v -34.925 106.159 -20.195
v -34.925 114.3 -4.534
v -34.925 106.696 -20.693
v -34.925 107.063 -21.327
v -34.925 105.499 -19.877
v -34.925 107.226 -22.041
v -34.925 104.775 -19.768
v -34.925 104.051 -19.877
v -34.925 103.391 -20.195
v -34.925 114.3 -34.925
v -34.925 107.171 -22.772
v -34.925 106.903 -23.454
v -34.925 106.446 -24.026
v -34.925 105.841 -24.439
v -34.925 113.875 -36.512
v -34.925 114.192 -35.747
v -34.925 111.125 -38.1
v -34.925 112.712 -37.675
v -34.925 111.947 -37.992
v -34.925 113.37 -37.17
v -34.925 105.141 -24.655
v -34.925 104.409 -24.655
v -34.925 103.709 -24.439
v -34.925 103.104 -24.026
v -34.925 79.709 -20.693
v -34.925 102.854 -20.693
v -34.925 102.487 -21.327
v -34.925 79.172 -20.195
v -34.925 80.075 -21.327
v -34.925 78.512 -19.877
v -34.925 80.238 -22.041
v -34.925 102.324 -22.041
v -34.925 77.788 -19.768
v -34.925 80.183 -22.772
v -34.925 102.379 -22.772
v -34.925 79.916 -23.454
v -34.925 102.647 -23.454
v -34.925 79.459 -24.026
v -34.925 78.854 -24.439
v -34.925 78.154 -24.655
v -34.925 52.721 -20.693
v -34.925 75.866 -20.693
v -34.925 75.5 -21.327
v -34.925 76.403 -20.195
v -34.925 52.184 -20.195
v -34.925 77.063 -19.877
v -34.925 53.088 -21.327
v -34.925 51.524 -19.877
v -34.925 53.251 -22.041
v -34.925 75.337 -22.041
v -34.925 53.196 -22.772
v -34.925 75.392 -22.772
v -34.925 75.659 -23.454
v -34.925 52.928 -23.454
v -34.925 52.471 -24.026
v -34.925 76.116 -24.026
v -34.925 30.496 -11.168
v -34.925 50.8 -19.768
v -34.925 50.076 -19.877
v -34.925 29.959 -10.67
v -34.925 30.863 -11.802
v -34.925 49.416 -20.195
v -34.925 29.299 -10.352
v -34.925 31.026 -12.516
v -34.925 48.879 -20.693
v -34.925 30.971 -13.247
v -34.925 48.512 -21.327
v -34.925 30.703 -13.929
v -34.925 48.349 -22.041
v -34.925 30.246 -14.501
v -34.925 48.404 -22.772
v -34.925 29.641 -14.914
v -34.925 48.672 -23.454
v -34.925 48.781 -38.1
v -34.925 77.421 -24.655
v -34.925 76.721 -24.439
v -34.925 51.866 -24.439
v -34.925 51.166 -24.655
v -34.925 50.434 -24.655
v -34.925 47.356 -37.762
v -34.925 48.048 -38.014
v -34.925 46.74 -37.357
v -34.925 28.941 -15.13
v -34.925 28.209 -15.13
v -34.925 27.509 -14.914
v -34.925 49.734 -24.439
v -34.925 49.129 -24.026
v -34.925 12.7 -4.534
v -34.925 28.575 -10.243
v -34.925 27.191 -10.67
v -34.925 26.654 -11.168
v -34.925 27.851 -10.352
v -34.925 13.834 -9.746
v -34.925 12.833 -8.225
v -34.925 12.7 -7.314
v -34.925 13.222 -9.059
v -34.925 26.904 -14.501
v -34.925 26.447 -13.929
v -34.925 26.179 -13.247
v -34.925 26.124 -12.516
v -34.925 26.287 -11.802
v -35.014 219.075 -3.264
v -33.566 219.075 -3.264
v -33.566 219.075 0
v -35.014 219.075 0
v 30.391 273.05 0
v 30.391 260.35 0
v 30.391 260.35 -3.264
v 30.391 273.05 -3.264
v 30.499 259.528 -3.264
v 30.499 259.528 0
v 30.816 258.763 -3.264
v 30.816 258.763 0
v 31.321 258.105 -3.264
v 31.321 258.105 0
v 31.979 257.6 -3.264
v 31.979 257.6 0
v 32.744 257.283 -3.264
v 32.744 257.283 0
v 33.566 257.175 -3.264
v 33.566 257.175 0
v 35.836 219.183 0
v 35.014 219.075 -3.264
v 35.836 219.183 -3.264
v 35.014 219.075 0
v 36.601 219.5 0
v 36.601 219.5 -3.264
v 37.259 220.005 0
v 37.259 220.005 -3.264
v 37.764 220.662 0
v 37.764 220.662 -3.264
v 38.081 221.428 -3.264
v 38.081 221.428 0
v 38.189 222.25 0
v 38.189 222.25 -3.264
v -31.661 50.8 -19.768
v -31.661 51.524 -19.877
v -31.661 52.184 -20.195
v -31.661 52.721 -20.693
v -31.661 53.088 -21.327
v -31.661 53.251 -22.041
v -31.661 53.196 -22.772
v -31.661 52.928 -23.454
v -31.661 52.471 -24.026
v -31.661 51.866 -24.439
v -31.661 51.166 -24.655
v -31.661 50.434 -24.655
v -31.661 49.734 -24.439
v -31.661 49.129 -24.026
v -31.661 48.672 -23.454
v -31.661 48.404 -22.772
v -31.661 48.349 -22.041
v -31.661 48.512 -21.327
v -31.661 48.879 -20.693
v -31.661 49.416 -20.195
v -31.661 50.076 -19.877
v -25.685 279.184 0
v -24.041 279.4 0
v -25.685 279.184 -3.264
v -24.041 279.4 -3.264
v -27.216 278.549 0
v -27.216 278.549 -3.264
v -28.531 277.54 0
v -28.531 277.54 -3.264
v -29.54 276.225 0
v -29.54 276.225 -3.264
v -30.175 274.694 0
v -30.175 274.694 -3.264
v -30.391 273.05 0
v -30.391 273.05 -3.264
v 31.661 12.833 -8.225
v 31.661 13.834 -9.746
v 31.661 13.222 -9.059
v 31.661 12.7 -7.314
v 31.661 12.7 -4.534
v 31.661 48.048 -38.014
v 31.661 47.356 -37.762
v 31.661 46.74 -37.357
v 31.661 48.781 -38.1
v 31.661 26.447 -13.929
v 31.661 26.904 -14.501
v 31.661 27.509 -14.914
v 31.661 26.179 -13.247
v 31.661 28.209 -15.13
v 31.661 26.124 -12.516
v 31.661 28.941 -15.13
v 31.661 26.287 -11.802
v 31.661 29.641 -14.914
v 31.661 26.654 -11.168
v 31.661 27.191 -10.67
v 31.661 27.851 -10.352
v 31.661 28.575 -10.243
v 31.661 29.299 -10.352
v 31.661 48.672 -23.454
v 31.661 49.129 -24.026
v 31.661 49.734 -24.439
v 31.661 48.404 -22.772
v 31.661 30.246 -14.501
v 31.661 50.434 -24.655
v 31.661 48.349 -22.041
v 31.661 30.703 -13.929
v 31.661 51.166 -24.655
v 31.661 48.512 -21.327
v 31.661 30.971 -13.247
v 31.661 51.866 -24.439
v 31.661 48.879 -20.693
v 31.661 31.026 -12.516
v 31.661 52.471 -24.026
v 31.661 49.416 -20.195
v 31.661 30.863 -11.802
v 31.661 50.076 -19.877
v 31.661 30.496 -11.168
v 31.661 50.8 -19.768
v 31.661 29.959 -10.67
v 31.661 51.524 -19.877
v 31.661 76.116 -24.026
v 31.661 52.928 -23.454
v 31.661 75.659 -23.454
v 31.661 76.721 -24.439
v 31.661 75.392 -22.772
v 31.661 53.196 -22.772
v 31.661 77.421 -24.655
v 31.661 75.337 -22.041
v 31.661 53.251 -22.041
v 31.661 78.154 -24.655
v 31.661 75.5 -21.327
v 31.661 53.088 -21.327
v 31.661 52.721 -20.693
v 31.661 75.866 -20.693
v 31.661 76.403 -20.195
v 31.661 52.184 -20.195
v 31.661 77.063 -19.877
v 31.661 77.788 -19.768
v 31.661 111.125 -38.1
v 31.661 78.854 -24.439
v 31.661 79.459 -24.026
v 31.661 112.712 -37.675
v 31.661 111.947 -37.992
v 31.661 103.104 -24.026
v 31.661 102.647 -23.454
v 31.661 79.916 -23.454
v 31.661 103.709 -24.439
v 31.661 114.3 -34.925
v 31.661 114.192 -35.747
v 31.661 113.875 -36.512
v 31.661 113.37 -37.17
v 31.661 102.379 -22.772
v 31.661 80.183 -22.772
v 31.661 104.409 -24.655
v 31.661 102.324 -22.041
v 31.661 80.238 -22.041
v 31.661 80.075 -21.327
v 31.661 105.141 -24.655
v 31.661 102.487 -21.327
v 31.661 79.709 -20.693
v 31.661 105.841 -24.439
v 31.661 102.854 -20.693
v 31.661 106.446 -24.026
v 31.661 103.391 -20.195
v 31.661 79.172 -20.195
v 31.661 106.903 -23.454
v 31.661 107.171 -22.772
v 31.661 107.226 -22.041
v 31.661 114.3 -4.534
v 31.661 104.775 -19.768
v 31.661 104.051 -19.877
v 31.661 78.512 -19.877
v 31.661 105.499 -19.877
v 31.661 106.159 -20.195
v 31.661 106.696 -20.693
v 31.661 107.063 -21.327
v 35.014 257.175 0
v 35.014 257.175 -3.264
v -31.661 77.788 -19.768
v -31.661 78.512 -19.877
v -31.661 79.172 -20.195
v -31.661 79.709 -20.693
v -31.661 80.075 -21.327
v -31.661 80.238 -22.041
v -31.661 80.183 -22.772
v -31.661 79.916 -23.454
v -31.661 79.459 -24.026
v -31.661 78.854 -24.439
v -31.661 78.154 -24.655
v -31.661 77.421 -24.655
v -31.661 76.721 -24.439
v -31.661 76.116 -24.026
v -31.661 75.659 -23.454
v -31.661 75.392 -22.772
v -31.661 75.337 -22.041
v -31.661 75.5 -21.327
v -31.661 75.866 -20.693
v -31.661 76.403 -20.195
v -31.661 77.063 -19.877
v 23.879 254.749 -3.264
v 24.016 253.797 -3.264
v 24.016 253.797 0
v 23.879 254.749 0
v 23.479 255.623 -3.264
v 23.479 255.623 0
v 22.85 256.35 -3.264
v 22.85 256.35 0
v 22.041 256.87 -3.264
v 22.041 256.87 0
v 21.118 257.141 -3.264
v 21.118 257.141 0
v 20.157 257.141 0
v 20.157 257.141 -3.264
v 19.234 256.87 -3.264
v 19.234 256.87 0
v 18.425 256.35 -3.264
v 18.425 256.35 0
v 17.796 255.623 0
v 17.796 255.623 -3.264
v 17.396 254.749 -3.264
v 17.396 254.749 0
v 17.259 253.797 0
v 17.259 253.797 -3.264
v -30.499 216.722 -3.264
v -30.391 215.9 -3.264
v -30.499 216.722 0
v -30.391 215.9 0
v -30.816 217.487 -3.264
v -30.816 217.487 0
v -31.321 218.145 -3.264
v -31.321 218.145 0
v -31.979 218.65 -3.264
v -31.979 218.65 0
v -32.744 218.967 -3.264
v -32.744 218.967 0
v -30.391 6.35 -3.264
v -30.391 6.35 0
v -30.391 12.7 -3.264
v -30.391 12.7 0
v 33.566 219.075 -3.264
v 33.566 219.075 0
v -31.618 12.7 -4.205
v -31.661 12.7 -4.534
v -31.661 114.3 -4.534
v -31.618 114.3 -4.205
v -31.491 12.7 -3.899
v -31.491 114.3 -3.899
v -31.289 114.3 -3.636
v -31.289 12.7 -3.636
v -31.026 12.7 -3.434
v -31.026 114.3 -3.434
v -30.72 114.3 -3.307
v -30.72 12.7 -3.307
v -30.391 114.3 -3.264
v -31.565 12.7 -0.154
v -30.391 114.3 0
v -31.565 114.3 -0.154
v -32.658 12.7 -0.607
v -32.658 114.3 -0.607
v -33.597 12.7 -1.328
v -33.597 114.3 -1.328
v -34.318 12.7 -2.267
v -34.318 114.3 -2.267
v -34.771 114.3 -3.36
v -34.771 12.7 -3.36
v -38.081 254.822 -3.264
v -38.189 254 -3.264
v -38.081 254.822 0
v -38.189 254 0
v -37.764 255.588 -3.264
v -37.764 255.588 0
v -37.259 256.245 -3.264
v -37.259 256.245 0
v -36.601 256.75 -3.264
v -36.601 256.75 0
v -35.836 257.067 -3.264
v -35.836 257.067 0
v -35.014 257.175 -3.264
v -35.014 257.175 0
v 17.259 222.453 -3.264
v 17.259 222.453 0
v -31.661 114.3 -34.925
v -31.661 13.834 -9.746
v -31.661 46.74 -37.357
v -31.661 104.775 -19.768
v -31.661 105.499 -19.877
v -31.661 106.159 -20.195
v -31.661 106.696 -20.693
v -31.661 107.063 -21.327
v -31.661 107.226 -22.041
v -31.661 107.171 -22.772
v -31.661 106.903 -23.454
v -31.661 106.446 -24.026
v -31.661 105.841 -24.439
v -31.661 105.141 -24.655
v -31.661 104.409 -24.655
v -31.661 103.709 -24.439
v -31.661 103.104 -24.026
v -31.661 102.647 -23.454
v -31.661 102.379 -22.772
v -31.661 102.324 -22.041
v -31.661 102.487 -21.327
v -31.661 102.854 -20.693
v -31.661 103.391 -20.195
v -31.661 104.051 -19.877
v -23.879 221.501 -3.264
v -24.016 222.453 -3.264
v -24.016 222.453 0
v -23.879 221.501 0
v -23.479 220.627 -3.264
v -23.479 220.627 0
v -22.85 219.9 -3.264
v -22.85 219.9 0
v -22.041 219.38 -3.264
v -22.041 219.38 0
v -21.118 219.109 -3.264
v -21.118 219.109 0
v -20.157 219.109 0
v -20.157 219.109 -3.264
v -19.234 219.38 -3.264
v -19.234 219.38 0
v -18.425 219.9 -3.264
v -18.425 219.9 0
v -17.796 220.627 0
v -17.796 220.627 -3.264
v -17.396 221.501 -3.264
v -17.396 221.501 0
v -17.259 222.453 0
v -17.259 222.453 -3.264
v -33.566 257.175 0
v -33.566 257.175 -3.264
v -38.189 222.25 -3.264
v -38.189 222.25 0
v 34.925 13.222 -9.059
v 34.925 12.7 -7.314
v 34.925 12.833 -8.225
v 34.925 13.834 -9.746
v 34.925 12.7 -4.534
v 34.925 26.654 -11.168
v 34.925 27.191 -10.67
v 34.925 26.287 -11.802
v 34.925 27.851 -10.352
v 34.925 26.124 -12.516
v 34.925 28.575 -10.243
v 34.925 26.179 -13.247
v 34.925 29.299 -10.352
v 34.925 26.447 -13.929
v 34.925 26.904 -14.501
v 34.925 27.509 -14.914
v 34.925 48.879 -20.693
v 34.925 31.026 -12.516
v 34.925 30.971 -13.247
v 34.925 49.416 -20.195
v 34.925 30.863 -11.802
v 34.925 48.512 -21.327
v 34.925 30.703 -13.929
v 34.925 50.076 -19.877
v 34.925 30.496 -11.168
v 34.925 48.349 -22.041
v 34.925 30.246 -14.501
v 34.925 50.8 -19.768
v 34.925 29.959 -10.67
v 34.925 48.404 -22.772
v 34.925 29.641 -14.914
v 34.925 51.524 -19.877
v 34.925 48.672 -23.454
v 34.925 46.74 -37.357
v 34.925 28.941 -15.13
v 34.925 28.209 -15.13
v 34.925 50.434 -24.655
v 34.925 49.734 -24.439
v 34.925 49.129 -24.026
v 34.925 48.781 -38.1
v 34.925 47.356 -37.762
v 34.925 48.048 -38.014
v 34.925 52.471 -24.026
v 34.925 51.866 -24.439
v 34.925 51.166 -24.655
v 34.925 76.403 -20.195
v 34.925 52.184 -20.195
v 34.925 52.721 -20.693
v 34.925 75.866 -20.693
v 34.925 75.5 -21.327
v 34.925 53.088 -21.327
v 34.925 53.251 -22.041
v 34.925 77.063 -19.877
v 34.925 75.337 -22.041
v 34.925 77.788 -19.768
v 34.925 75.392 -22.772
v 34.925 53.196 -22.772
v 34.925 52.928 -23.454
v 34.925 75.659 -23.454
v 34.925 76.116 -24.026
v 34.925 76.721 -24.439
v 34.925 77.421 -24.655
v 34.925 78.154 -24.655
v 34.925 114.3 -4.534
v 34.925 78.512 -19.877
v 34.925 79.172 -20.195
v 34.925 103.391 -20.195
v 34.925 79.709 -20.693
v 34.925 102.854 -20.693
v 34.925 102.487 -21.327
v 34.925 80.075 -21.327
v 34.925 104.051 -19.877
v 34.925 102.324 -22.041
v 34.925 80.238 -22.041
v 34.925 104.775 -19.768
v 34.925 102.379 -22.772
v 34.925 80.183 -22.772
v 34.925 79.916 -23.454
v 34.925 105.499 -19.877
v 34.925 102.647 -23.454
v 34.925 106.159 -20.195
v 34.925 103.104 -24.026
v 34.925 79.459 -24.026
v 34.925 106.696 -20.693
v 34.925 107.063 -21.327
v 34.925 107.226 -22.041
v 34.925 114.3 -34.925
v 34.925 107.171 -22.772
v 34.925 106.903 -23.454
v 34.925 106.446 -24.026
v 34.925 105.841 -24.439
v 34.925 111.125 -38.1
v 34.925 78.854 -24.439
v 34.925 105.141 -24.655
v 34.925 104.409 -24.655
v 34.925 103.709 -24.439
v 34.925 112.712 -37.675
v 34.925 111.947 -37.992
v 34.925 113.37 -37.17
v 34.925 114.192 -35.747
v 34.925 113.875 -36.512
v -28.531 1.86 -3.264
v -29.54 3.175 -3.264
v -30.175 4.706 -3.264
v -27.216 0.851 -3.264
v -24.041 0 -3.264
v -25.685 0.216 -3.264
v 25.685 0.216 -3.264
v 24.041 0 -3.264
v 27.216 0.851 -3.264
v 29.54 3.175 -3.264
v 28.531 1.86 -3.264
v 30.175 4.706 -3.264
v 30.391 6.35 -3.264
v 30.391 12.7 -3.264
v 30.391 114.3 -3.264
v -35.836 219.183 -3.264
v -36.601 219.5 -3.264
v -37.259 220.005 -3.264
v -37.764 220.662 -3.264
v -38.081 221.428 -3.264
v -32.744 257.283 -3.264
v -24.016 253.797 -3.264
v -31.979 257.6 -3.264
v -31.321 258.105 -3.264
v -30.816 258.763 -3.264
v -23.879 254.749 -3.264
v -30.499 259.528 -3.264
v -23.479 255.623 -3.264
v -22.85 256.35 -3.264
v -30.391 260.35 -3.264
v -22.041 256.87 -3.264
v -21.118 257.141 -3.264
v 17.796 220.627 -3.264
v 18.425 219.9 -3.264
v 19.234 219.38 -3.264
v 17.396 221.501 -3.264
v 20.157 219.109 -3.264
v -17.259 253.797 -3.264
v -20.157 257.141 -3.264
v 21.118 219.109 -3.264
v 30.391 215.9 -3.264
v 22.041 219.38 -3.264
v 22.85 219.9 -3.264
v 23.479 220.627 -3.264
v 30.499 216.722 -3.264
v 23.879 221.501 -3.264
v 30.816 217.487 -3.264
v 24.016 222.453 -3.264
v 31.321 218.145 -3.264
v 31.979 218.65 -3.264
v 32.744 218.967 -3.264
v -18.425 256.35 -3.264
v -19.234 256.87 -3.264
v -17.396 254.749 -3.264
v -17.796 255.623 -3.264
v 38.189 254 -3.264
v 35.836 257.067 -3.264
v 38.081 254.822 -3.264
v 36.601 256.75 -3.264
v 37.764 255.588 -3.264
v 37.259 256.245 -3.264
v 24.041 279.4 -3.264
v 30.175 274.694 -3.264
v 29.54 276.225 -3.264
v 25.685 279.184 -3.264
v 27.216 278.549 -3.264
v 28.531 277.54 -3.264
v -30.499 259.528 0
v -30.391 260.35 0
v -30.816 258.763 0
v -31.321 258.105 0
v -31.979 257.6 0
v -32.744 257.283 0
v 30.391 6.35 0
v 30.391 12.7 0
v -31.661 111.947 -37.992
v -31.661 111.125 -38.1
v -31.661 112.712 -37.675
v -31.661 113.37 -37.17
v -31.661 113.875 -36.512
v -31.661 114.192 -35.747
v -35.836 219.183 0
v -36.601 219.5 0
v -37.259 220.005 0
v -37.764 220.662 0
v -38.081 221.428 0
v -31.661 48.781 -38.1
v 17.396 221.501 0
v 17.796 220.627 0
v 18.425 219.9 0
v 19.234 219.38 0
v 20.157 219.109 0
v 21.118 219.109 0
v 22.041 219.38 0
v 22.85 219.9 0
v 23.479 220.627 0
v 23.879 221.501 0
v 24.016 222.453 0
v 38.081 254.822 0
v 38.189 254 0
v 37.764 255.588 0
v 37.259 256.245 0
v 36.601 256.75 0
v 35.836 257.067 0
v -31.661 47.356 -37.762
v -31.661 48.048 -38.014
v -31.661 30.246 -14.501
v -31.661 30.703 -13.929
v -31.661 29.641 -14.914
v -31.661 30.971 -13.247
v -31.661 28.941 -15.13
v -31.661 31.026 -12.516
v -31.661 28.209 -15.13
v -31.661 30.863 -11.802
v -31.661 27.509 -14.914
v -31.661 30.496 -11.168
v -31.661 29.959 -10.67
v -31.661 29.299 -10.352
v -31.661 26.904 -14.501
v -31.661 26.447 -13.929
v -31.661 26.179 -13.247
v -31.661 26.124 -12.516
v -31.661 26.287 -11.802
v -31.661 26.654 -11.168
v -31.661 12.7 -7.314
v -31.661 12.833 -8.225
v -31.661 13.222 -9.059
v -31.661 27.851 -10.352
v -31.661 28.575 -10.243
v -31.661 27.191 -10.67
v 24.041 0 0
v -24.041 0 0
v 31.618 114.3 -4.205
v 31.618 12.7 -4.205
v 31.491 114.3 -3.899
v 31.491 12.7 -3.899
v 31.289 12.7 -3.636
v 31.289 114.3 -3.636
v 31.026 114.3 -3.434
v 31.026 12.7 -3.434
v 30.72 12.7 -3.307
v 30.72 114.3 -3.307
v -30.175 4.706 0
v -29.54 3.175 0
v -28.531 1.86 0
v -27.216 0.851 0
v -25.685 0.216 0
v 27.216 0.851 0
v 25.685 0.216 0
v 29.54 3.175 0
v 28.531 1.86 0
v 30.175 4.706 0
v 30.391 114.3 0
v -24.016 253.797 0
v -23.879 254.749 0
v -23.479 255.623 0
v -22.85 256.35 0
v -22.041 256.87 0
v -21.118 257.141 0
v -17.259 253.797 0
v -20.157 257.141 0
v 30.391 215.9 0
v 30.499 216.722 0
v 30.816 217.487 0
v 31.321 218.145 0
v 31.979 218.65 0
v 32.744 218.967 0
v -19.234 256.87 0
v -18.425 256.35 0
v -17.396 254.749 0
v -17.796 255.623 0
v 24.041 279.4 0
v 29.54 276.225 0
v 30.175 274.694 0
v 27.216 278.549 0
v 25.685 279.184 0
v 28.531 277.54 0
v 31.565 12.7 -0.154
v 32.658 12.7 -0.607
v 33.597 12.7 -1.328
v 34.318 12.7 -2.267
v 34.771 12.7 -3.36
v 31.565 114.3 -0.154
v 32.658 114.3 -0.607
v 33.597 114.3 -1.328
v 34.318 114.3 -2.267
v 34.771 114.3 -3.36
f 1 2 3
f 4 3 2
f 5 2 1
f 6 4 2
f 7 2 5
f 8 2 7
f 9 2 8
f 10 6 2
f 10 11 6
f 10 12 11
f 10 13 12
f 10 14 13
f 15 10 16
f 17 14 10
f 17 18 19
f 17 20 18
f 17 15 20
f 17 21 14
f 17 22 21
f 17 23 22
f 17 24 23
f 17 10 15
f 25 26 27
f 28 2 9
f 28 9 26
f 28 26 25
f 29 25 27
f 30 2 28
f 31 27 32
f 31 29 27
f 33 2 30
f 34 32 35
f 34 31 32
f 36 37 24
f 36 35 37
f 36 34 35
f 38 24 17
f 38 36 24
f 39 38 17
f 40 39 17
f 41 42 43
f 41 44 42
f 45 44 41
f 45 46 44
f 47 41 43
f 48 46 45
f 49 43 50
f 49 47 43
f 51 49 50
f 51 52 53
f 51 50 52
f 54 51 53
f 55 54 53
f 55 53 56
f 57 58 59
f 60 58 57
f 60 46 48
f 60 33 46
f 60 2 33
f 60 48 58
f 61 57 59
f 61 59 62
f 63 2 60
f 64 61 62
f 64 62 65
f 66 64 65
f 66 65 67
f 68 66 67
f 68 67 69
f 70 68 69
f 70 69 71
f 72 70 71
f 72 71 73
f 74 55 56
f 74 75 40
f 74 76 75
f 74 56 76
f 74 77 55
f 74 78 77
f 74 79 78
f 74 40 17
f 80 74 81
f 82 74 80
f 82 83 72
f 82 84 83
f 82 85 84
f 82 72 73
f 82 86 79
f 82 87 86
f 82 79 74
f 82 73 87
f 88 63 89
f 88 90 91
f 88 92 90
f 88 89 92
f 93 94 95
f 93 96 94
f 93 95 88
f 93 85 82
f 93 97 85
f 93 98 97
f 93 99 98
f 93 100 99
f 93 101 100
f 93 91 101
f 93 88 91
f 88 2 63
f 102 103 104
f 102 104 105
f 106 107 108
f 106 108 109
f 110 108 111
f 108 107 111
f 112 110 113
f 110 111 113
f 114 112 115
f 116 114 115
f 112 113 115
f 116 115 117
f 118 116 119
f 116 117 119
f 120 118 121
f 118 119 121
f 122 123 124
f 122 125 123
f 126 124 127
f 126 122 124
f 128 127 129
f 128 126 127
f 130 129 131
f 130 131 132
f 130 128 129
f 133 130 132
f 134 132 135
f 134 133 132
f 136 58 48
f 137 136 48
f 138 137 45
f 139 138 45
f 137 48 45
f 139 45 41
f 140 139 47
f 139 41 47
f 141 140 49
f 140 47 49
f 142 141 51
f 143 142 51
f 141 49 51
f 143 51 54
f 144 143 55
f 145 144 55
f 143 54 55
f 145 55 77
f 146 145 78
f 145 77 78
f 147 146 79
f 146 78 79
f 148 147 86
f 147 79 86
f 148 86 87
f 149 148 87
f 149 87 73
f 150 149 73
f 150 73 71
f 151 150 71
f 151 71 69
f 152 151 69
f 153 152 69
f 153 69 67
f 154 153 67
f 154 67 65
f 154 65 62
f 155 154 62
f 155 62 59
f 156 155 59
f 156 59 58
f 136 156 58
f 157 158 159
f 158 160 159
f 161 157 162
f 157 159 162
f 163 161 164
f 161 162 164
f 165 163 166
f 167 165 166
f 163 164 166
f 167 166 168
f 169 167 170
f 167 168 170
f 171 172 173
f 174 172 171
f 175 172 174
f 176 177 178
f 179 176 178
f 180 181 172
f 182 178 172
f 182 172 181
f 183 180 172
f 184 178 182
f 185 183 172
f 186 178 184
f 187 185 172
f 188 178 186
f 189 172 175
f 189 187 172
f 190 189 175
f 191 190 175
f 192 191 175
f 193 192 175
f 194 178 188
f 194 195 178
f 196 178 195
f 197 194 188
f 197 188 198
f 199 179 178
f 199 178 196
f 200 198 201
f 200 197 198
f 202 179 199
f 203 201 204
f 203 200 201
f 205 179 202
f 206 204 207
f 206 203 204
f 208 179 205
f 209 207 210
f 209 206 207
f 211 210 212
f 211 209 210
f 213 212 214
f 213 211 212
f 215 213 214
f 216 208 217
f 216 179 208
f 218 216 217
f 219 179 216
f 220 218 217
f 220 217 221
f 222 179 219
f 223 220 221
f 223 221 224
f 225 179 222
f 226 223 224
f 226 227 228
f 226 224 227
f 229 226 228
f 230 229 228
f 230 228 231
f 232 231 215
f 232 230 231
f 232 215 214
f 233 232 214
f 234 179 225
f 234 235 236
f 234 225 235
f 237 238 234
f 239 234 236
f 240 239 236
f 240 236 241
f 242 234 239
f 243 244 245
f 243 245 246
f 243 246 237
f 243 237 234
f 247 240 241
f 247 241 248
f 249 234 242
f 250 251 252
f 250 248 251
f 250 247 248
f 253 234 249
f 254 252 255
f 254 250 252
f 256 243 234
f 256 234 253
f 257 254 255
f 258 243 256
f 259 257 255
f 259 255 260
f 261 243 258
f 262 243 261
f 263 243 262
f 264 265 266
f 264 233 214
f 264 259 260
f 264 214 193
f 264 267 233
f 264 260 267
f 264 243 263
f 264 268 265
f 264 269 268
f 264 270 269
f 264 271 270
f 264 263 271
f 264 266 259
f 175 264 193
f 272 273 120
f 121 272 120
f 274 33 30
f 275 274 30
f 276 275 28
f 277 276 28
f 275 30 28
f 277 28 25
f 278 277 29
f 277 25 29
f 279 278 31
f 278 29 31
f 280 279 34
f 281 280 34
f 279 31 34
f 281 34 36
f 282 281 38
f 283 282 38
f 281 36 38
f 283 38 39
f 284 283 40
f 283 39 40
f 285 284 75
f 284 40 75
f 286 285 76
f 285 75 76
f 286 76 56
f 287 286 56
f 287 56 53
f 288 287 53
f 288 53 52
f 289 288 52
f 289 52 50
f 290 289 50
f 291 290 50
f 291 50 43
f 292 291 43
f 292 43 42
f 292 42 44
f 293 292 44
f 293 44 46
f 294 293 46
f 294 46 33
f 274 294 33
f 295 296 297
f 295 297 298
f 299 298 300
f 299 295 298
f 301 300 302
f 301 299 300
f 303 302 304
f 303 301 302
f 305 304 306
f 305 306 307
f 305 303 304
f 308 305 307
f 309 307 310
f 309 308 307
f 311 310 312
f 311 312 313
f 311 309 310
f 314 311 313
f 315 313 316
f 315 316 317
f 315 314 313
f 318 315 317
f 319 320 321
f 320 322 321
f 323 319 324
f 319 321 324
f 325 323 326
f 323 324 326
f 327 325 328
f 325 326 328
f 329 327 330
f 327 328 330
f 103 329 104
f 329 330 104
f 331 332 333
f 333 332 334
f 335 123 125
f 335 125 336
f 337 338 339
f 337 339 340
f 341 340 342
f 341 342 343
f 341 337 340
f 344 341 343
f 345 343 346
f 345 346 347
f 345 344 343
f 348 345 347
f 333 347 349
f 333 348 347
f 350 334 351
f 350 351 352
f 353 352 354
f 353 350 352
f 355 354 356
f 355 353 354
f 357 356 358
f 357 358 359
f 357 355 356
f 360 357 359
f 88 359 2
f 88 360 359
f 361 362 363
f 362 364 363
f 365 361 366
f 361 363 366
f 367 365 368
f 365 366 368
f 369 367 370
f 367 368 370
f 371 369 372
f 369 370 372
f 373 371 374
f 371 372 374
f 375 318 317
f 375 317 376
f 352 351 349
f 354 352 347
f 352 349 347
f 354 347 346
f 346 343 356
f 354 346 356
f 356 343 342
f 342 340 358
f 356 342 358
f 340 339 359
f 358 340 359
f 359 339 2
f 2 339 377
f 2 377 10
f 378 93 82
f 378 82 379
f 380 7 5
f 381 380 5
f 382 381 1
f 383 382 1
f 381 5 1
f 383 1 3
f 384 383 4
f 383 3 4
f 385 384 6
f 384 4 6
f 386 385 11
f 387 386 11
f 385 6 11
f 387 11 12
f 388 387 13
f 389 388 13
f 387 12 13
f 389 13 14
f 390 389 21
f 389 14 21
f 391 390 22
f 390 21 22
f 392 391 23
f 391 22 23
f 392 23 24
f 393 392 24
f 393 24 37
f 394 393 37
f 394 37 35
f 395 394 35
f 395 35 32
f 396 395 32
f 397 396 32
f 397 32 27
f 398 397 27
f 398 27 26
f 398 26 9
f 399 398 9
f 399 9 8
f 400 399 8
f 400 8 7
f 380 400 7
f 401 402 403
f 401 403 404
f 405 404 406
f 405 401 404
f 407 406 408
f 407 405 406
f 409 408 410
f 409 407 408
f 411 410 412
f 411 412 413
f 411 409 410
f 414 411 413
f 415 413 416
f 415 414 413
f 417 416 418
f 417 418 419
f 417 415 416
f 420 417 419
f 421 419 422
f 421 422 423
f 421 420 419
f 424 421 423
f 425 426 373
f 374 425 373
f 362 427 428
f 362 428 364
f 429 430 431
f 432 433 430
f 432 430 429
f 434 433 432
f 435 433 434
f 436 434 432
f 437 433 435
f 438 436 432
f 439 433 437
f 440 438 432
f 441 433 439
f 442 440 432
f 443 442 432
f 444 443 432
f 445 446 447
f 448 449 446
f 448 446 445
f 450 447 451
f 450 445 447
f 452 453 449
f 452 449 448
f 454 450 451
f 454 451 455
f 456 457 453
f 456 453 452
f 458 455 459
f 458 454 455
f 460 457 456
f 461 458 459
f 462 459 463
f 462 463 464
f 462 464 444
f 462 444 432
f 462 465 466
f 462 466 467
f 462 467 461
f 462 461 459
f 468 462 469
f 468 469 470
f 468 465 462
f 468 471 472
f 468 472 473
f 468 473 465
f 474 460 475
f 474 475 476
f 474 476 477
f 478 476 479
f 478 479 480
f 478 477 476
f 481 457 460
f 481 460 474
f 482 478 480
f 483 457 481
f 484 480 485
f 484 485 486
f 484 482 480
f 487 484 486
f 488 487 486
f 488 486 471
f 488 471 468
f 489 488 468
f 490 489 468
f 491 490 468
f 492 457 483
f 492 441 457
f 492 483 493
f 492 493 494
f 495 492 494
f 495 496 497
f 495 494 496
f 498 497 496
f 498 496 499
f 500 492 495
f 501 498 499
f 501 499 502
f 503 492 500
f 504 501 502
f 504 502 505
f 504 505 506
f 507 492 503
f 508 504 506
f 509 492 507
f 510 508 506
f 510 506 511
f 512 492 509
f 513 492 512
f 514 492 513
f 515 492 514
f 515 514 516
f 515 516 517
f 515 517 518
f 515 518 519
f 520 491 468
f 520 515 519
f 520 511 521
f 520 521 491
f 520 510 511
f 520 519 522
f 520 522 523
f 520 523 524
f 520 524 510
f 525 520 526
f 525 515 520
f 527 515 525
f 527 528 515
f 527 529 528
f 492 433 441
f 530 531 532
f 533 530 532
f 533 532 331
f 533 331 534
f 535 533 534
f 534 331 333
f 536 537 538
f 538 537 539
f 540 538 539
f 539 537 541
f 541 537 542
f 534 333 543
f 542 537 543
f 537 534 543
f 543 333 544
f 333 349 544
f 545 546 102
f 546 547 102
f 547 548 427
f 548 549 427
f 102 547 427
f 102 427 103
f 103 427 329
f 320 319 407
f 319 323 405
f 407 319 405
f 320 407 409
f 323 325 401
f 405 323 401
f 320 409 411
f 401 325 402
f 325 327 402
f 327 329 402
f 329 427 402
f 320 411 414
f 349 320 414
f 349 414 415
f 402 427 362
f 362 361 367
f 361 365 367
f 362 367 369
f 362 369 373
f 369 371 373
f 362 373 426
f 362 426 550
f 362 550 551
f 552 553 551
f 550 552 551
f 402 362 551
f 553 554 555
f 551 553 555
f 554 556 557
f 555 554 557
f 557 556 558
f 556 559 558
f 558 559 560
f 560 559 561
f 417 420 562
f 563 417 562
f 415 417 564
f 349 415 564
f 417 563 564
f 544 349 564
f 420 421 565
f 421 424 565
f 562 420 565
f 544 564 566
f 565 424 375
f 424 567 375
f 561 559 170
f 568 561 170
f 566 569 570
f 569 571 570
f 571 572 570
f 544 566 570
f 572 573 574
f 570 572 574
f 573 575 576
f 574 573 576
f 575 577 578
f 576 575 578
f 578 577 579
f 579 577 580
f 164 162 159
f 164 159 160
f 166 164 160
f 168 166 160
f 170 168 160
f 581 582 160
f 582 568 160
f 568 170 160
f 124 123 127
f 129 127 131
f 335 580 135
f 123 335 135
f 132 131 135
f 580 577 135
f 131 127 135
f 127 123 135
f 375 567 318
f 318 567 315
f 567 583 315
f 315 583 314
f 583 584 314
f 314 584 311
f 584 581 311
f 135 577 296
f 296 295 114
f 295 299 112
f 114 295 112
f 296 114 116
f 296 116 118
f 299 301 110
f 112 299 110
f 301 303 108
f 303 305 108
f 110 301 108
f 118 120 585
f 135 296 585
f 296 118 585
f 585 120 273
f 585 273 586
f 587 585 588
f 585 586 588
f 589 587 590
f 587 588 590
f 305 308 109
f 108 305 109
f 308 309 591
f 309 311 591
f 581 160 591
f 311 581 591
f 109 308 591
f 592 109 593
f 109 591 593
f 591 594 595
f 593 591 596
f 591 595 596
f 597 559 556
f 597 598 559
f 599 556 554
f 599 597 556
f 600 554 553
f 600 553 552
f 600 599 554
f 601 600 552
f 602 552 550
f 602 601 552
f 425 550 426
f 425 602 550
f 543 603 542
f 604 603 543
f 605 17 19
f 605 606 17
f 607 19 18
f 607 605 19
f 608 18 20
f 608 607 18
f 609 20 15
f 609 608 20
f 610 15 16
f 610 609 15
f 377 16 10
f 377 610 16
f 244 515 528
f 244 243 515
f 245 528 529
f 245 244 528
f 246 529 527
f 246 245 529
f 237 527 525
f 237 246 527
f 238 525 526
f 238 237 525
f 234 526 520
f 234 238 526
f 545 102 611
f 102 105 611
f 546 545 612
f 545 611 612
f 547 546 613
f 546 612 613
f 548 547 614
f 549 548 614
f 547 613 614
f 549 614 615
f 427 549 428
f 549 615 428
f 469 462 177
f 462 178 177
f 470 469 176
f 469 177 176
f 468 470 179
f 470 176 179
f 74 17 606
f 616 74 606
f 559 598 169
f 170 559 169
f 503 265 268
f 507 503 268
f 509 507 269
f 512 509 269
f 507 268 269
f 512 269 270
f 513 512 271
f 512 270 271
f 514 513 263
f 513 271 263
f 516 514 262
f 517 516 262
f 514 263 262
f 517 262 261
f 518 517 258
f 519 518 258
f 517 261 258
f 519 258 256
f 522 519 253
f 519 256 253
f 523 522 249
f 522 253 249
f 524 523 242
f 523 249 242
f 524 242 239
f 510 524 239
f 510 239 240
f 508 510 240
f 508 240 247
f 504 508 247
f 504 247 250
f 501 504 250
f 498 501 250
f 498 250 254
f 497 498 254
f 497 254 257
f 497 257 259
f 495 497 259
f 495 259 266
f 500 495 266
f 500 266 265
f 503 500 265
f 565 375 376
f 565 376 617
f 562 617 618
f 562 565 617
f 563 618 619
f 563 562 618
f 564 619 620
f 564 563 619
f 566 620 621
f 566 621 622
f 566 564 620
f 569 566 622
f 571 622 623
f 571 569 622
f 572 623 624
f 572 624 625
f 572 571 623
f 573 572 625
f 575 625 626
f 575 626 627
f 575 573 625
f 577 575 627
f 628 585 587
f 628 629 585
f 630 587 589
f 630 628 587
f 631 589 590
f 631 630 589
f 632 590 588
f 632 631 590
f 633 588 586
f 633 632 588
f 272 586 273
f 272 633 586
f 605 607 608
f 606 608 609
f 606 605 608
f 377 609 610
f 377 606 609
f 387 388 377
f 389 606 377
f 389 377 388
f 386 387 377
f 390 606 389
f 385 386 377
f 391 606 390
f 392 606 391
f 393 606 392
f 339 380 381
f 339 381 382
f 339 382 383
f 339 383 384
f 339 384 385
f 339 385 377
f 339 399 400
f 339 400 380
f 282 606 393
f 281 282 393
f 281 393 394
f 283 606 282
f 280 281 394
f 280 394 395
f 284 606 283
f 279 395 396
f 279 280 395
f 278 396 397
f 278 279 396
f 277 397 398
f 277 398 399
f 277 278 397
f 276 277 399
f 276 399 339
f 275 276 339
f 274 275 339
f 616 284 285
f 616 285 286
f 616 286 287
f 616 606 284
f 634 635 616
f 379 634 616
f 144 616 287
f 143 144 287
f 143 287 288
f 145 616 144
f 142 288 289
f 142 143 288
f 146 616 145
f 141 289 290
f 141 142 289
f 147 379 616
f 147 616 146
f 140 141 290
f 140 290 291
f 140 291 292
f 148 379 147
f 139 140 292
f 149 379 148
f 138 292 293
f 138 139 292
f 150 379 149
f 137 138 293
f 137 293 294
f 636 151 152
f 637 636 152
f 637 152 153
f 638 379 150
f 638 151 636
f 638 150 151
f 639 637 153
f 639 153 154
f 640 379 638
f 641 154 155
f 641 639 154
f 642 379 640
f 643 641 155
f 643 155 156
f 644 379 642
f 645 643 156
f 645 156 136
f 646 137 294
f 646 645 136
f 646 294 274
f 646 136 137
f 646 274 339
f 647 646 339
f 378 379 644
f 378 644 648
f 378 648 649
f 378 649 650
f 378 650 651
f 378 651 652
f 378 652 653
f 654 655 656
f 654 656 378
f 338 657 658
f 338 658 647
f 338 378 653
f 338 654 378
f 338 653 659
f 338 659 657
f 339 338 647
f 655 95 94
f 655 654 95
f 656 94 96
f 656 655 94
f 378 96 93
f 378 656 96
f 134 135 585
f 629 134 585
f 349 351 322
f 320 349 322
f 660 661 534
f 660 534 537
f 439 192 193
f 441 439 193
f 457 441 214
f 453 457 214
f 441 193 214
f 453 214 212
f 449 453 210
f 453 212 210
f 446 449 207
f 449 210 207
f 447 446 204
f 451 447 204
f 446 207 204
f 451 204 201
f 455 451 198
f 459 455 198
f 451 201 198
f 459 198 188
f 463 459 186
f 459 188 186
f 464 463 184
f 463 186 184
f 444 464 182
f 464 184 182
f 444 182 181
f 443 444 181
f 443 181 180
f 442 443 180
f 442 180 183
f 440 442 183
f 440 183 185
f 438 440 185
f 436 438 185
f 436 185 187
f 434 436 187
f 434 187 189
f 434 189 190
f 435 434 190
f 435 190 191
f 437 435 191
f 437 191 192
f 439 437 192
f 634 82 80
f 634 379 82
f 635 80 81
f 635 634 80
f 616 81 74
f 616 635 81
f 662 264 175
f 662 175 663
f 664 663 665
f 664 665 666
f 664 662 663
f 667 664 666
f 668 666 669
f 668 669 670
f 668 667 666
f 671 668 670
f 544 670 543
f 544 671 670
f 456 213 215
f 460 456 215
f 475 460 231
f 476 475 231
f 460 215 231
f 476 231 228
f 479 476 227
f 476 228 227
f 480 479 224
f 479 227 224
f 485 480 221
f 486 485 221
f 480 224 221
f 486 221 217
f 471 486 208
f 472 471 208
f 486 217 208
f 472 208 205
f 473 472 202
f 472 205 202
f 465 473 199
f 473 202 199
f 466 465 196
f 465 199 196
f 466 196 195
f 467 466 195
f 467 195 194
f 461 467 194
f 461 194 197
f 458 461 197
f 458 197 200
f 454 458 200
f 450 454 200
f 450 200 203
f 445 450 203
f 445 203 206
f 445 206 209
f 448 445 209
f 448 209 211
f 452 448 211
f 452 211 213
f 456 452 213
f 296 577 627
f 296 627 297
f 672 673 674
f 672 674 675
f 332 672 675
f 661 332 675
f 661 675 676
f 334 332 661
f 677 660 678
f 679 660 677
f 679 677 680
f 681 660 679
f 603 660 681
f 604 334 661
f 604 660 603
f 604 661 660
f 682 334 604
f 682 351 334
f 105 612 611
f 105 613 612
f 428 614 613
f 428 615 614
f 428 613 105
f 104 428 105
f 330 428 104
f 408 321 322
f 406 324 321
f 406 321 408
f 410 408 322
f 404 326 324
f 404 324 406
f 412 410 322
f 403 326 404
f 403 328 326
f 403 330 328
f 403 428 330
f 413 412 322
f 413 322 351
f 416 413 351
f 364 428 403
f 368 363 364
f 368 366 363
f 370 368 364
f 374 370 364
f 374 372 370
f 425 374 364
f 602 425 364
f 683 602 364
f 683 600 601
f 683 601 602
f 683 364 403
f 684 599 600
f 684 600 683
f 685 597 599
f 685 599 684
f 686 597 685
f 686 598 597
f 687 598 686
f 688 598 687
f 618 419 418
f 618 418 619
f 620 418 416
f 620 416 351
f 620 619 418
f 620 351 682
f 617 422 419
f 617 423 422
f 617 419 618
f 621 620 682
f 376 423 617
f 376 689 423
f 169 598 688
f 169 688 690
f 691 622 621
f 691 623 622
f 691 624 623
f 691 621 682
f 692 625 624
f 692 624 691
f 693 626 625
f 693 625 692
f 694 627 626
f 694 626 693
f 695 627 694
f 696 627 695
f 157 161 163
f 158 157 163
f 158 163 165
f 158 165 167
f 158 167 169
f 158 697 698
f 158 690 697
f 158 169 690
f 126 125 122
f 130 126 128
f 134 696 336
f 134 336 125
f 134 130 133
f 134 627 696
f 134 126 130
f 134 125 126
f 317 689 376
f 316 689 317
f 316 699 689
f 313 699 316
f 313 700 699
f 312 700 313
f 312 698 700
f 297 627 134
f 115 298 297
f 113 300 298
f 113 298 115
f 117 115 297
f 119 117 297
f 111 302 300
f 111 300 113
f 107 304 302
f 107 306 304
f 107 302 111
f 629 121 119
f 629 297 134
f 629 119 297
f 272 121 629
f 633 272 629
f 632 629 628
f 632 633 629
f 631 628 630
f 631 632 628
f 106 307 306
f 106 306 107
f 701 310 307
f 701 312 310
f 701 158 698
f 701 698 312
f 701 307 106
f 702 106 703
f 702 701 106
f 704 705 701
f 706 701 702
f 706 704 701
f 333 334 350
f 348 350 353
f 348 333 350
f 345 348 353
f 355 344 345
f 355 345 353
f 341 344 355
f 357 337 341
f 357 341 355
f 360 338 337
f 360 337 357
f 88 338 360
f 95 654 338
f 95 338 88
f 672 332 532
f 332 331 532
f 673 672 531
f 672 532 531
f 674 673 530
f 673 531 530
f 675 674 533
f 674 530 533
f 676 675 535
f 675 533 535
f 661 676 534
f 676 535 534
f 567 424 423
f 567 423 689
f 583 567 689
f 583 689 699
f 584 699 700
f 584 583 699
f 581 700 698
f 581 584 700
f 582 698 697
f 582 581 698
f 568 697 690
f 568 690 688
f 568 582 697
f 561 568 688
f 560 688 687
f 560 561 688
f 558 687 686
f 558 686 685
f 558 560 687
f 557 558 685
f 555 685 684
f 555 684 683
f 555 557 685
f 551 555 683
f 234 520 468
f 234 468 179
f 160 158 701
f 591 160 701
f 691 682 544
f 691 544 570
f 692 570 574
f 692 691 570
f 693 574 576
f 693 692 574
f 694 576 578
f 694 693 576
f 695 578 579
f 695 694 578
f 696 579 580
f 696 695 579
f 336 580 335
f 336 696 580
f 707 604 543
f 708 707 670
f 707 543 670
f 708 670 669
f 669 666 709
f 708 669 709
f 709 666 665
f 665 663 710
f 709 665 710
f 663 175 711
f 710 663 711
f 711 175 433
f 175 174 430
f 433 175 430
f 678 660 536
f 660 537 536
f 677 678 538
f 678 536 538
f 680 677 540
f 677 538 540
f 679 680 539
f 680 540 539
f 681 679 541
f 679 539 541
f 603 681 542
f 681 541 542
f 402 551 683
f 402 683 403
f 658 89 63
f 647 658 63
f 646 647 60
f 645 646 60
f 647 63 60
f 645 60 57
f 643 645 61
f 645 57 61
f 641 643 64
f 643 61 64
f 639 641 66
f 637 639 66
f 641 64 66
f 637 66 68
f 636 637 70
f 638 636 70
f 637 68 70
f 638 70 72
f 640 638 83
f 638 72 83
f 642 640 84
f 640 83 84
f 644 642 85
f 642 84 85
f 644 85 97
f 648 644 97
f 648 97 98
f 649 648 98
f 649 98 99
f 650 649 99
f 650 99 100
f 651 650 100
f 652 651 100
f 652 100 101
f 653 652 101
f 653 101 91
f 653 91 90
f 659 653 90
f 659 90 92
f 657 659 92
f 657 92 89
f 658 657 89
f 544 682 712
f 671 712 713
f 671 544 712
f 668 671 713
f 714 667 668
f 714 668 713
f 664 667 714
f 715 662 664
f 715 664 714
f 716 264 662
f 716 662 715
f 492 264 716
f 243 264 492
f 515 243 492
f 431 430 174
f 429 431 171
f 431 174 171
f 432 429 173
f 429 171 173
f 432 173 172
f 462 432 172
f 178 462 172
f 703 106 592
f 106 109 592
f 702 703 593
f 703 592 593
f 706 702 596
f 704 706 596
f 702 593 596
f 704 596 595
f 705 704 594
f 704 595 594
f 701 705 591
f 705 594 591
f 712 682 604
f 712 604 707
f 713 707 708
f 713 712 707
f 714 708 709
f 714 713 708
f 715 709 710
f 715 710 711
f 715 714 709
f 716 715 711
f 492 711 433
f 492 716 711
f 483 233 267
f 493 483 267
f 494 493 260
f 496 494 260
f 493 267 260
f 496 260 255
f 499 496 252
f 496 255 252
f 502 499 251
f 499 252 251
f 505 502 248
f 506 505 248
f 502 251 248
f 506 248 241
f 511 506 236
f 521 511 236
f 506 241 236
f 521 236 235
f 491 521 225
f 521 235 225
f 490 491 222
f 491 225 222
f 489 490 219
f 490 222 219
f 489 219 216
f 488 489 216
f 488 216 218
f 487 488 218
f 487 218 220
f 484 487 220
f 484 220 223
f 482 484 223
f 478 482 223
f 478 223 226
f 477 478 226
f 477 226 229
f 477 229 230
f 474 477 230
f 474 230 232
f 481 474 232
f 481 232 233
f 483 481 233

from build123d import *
from OCP.BRepFilletAPI import BRepFilletAPI_MakeChamfer

# Parameters (mm, degrees)
SKETCH2_W                    = 60.7822
SKETCH2_H                    = 279.4
BASE_FLANGE1_DEPTH           = 3.2639
EDGE_FLANGE1_DEPTH           = 101.6
EDGE_FLANGE1_BEND_DEPTH      = 101.6
CHAMFER1_SIZE                = 34.925
CHAMFER1_SIZE2               = 29.305554619
F_10_0_1935_DIAMETER_HOLE1_D = 4.9149
F_1_4_START                  = -3.2639
F_1_4_CLEARANCE_SLOT1_DEPTH  = 3.2639
SKETCH17_W                   = 7.7978
SKETCH17_H                   = 38.1
BOSS_EXTRUDE1_DEPTH          = 3.2639
FILLET1_R                    = 3.175
FILLET2_R                    = 6.35


# Read off the part's stored shape, not the designer's step: 1/4 Clearance Slot1
# Sheet-metal steps are written as plain solids
with BuildPart() as part:
    # Sketch2 → Base-Flange1 (new body)
    with BuildSketch(Plane.XY):
        with Locations((0, 139.7)):
            Rectangle(SKETCH2_W, SKETCH2_H)
    extrude(amount=-BASE_FLANGE1_DEPTH)

    # Edge-Flange1 section (across the edge) → Edge-Flange1 (add)
    with BuildSketch(Plane(origin=(31.6611, 114.3, -3.2639), x_dir=(-1, 0, 0), z_dir=(0, -1, 0))):
        with BuildLine():
            Line((-3.2639, 1.27), (-3.2639, 34.8361))
            Line((-3.2639, 34.8361), (0, 34.8361))
            Line((0, 34.8361), (0, 1.27))
            ThreePointArc((0, 1.27), (0.371974388, 0.371974388), (1.27, 0))
            Line((1.27, 0), (1.27, -3.2639))
            ThreePointArc((1.27, -3.2639), (-1.935951435, -1.935951435), (-3.2639, 1.27))
        make_face()
    extrude(amount=EDGE_FLANGE1_DEPTH)

    # Edge-Flange1 section 2 (across the edge) → Edge-Flange1 bend (add)
    with BuildSketch(Plane(origin=(-31.6611, 12.7, -3.2639), x_dir=(1, 0, 0), z_dir=(0, 1, 0))):
        with BuildLine():
            Line((-3.2639, 1.27), (-3.2639, 34.8361))
            Line((-3.2639, 34.8361), (0, 34.8361))
            Line((0, 34.8361), (0, 1.27))
            ThreePointArc((0, 1.27), (0.371974388, 0.371974388), (1.27, 0))
            Line((1.27, 0), (1.27, -3.2639))
            ThreePointArc((1.27, -3.2639), (-1.935951435, -1.935951435), (-3.2639, 1.27))
        make_face()
    extrude(amount=EDGE_FLANGE1_BEND_DEPTH)

    # Chamfer1: one chamfer whose edges measure the first distance from different faces: ONE call of the kernel's chamfer builder (chamfer() names one face for all edges)
    chamfer1_edges_1 = [part.edges().sort_by_distance(p)[0] for p in [
        (33.29305, 12.7, -38.1),
    ]]
    chamfer1_side_1 = [part.faces().sort_by_distance(p)[0] for p in [
        (33.29305, 63.5, -38.1),
    ]]
    chamfer1_edges_2 = [part.edges().sort_by_distance(p)[0] for p in [
        (-33.29305, 12.7, -38.1),
    ]]
    chamfer1_side_2 = [part.faces().sort_by_distance(p)[0] for p in [
        (-33.29305, 63.5, -38.1),
    ]]
    chamfer1 = BRepFilletAPI_MakeChamfer(part.part.solid().wrapped)
    for e in chamfer1_edges_1:
        chamfer1.Add(CHAMFER1_SIZE, CHAMFER1_SIZE2, e.wrapped, chamfer1_side_1[0].wrapped)  # the first distance lies on this face
    for e in chamfer1_edges_2:
        chamfer1.Add(CHAMFER1_SIZE, CHAMFER1_SIZE2, e.wrapped, chamfer1_side_2[0].wrapped)  # the first distance lies on this face
    add(Compound.cast(chamfer1.Shape()), mode=Mode.REPLACE)

    # #10 (0.1935) Diameter Hole1 (through all)
    with Locations(Plane(origin=(34.925, 0, 0), x_dir=(0, 0, -1), z_dir=(1, 0, 0))):
        with Locations((22.225, 104.775), (22.225, 77.7875), (22.225, 50.8), (12.7, 28.575)):
            Hole(F_10_0_1935_DIAMETER_HOLE1_D / 2)

    # 1/4 Clearance Slot1 outline → 1/4 Clearance Slot1 (cut)
    with BuildSketch(Plane.XY.offset(F_1_4_START)):
        with BuildLine():
            ThreePointArc((-17.2593, 253.7968), (-20.6375, 257.175), (-24.0157, 253.7968))
            Line((-24.0157, 253.7968), (-24.0157, 222.4532))
            ThreePointArc((-24.0157, 222.4532), (-20.6375, 219.075), (-17.2593, 222.4532))
            Line((-17.2593, 222.4532), (-17.2593, 253.7968))
        make_face()
        with BuildLine():
            ThreePointArc((24.0157, 253.7968), (20.6375, 257.175), (17.2593, 253.7968))
            Line((17.2593, 253.7968), (17.2593, 222.4532))
            ThreePointArc((17.2593, 222.4532), (20.6375, 219.075), (24.0157, 222.4532))
            Line((24.0157, 222.4532), (24.0157, 253.7968))
        make_face()
    extrude(amount=F_1_4_CLEARANCE_SLOT1_DEPTH, mode=Mode.SUBTRACT)

    # Sketch17 → Boss-Extrude1 (add)
    with BuildSketch(Plane(origin=(0, 0, -3.2639), x_dir=(-1, 0, 0), z_dir=(0, 0, -1))):
        with Locations((-34.29, 238.125)):
            Rectangle(SKETCH17_W, SKETCH17_H)
        with Locations((34.29, 238.125)):
            Rectangle(SKETCH17_W, SKETCH17_H)
    extrude(amount=-BOSS_EXTRUDE1_DEPTH)

    # Fillet1
    fillet1_edges = [part.edges().sort_by_distance(p)[0] for p in [
        (30.3911, 219.075, -1.63195),
        (30.3911, 257.175, -1.63195),
        (38.1889, 257.175, -1.63195),
        (38.1889, 219.075, -1.63195),
        (-38.1889, 257.175, -1.63195),
        (-38.1889, 219.075, -1.63195),
        (-30.3911, 219.075, -1.63195),
        (-30.3911, 257.175, -1.63195),
        (33.29305, 114.3, -38.1),
        (-33.29305, 114.3, -38.1),
        (33.29305, 47.625, -38.1),
        (33.29305, 12.7, -8.794445381),
        (-33.29305, 12.7, -8.794445381),
        (-33.29305, 47.625, -38.1),
    ]]
    fillet(fillet1_edges, radius=FILLET1_R)

    # Fillet2
    fillet2_edges = [part.edges().sort_by_distance(p)[0] for p in [
        (-30.3911, 279.4, -1.63195),
        (30.3911, 279.4, -1.63195),
        (30.3911, 0, -1.63195),
        (-30.3911, 0, -1.63195),
    ]]
    fillet(fillet2_edges, radius=FILLET2_R)


solid = part.part
